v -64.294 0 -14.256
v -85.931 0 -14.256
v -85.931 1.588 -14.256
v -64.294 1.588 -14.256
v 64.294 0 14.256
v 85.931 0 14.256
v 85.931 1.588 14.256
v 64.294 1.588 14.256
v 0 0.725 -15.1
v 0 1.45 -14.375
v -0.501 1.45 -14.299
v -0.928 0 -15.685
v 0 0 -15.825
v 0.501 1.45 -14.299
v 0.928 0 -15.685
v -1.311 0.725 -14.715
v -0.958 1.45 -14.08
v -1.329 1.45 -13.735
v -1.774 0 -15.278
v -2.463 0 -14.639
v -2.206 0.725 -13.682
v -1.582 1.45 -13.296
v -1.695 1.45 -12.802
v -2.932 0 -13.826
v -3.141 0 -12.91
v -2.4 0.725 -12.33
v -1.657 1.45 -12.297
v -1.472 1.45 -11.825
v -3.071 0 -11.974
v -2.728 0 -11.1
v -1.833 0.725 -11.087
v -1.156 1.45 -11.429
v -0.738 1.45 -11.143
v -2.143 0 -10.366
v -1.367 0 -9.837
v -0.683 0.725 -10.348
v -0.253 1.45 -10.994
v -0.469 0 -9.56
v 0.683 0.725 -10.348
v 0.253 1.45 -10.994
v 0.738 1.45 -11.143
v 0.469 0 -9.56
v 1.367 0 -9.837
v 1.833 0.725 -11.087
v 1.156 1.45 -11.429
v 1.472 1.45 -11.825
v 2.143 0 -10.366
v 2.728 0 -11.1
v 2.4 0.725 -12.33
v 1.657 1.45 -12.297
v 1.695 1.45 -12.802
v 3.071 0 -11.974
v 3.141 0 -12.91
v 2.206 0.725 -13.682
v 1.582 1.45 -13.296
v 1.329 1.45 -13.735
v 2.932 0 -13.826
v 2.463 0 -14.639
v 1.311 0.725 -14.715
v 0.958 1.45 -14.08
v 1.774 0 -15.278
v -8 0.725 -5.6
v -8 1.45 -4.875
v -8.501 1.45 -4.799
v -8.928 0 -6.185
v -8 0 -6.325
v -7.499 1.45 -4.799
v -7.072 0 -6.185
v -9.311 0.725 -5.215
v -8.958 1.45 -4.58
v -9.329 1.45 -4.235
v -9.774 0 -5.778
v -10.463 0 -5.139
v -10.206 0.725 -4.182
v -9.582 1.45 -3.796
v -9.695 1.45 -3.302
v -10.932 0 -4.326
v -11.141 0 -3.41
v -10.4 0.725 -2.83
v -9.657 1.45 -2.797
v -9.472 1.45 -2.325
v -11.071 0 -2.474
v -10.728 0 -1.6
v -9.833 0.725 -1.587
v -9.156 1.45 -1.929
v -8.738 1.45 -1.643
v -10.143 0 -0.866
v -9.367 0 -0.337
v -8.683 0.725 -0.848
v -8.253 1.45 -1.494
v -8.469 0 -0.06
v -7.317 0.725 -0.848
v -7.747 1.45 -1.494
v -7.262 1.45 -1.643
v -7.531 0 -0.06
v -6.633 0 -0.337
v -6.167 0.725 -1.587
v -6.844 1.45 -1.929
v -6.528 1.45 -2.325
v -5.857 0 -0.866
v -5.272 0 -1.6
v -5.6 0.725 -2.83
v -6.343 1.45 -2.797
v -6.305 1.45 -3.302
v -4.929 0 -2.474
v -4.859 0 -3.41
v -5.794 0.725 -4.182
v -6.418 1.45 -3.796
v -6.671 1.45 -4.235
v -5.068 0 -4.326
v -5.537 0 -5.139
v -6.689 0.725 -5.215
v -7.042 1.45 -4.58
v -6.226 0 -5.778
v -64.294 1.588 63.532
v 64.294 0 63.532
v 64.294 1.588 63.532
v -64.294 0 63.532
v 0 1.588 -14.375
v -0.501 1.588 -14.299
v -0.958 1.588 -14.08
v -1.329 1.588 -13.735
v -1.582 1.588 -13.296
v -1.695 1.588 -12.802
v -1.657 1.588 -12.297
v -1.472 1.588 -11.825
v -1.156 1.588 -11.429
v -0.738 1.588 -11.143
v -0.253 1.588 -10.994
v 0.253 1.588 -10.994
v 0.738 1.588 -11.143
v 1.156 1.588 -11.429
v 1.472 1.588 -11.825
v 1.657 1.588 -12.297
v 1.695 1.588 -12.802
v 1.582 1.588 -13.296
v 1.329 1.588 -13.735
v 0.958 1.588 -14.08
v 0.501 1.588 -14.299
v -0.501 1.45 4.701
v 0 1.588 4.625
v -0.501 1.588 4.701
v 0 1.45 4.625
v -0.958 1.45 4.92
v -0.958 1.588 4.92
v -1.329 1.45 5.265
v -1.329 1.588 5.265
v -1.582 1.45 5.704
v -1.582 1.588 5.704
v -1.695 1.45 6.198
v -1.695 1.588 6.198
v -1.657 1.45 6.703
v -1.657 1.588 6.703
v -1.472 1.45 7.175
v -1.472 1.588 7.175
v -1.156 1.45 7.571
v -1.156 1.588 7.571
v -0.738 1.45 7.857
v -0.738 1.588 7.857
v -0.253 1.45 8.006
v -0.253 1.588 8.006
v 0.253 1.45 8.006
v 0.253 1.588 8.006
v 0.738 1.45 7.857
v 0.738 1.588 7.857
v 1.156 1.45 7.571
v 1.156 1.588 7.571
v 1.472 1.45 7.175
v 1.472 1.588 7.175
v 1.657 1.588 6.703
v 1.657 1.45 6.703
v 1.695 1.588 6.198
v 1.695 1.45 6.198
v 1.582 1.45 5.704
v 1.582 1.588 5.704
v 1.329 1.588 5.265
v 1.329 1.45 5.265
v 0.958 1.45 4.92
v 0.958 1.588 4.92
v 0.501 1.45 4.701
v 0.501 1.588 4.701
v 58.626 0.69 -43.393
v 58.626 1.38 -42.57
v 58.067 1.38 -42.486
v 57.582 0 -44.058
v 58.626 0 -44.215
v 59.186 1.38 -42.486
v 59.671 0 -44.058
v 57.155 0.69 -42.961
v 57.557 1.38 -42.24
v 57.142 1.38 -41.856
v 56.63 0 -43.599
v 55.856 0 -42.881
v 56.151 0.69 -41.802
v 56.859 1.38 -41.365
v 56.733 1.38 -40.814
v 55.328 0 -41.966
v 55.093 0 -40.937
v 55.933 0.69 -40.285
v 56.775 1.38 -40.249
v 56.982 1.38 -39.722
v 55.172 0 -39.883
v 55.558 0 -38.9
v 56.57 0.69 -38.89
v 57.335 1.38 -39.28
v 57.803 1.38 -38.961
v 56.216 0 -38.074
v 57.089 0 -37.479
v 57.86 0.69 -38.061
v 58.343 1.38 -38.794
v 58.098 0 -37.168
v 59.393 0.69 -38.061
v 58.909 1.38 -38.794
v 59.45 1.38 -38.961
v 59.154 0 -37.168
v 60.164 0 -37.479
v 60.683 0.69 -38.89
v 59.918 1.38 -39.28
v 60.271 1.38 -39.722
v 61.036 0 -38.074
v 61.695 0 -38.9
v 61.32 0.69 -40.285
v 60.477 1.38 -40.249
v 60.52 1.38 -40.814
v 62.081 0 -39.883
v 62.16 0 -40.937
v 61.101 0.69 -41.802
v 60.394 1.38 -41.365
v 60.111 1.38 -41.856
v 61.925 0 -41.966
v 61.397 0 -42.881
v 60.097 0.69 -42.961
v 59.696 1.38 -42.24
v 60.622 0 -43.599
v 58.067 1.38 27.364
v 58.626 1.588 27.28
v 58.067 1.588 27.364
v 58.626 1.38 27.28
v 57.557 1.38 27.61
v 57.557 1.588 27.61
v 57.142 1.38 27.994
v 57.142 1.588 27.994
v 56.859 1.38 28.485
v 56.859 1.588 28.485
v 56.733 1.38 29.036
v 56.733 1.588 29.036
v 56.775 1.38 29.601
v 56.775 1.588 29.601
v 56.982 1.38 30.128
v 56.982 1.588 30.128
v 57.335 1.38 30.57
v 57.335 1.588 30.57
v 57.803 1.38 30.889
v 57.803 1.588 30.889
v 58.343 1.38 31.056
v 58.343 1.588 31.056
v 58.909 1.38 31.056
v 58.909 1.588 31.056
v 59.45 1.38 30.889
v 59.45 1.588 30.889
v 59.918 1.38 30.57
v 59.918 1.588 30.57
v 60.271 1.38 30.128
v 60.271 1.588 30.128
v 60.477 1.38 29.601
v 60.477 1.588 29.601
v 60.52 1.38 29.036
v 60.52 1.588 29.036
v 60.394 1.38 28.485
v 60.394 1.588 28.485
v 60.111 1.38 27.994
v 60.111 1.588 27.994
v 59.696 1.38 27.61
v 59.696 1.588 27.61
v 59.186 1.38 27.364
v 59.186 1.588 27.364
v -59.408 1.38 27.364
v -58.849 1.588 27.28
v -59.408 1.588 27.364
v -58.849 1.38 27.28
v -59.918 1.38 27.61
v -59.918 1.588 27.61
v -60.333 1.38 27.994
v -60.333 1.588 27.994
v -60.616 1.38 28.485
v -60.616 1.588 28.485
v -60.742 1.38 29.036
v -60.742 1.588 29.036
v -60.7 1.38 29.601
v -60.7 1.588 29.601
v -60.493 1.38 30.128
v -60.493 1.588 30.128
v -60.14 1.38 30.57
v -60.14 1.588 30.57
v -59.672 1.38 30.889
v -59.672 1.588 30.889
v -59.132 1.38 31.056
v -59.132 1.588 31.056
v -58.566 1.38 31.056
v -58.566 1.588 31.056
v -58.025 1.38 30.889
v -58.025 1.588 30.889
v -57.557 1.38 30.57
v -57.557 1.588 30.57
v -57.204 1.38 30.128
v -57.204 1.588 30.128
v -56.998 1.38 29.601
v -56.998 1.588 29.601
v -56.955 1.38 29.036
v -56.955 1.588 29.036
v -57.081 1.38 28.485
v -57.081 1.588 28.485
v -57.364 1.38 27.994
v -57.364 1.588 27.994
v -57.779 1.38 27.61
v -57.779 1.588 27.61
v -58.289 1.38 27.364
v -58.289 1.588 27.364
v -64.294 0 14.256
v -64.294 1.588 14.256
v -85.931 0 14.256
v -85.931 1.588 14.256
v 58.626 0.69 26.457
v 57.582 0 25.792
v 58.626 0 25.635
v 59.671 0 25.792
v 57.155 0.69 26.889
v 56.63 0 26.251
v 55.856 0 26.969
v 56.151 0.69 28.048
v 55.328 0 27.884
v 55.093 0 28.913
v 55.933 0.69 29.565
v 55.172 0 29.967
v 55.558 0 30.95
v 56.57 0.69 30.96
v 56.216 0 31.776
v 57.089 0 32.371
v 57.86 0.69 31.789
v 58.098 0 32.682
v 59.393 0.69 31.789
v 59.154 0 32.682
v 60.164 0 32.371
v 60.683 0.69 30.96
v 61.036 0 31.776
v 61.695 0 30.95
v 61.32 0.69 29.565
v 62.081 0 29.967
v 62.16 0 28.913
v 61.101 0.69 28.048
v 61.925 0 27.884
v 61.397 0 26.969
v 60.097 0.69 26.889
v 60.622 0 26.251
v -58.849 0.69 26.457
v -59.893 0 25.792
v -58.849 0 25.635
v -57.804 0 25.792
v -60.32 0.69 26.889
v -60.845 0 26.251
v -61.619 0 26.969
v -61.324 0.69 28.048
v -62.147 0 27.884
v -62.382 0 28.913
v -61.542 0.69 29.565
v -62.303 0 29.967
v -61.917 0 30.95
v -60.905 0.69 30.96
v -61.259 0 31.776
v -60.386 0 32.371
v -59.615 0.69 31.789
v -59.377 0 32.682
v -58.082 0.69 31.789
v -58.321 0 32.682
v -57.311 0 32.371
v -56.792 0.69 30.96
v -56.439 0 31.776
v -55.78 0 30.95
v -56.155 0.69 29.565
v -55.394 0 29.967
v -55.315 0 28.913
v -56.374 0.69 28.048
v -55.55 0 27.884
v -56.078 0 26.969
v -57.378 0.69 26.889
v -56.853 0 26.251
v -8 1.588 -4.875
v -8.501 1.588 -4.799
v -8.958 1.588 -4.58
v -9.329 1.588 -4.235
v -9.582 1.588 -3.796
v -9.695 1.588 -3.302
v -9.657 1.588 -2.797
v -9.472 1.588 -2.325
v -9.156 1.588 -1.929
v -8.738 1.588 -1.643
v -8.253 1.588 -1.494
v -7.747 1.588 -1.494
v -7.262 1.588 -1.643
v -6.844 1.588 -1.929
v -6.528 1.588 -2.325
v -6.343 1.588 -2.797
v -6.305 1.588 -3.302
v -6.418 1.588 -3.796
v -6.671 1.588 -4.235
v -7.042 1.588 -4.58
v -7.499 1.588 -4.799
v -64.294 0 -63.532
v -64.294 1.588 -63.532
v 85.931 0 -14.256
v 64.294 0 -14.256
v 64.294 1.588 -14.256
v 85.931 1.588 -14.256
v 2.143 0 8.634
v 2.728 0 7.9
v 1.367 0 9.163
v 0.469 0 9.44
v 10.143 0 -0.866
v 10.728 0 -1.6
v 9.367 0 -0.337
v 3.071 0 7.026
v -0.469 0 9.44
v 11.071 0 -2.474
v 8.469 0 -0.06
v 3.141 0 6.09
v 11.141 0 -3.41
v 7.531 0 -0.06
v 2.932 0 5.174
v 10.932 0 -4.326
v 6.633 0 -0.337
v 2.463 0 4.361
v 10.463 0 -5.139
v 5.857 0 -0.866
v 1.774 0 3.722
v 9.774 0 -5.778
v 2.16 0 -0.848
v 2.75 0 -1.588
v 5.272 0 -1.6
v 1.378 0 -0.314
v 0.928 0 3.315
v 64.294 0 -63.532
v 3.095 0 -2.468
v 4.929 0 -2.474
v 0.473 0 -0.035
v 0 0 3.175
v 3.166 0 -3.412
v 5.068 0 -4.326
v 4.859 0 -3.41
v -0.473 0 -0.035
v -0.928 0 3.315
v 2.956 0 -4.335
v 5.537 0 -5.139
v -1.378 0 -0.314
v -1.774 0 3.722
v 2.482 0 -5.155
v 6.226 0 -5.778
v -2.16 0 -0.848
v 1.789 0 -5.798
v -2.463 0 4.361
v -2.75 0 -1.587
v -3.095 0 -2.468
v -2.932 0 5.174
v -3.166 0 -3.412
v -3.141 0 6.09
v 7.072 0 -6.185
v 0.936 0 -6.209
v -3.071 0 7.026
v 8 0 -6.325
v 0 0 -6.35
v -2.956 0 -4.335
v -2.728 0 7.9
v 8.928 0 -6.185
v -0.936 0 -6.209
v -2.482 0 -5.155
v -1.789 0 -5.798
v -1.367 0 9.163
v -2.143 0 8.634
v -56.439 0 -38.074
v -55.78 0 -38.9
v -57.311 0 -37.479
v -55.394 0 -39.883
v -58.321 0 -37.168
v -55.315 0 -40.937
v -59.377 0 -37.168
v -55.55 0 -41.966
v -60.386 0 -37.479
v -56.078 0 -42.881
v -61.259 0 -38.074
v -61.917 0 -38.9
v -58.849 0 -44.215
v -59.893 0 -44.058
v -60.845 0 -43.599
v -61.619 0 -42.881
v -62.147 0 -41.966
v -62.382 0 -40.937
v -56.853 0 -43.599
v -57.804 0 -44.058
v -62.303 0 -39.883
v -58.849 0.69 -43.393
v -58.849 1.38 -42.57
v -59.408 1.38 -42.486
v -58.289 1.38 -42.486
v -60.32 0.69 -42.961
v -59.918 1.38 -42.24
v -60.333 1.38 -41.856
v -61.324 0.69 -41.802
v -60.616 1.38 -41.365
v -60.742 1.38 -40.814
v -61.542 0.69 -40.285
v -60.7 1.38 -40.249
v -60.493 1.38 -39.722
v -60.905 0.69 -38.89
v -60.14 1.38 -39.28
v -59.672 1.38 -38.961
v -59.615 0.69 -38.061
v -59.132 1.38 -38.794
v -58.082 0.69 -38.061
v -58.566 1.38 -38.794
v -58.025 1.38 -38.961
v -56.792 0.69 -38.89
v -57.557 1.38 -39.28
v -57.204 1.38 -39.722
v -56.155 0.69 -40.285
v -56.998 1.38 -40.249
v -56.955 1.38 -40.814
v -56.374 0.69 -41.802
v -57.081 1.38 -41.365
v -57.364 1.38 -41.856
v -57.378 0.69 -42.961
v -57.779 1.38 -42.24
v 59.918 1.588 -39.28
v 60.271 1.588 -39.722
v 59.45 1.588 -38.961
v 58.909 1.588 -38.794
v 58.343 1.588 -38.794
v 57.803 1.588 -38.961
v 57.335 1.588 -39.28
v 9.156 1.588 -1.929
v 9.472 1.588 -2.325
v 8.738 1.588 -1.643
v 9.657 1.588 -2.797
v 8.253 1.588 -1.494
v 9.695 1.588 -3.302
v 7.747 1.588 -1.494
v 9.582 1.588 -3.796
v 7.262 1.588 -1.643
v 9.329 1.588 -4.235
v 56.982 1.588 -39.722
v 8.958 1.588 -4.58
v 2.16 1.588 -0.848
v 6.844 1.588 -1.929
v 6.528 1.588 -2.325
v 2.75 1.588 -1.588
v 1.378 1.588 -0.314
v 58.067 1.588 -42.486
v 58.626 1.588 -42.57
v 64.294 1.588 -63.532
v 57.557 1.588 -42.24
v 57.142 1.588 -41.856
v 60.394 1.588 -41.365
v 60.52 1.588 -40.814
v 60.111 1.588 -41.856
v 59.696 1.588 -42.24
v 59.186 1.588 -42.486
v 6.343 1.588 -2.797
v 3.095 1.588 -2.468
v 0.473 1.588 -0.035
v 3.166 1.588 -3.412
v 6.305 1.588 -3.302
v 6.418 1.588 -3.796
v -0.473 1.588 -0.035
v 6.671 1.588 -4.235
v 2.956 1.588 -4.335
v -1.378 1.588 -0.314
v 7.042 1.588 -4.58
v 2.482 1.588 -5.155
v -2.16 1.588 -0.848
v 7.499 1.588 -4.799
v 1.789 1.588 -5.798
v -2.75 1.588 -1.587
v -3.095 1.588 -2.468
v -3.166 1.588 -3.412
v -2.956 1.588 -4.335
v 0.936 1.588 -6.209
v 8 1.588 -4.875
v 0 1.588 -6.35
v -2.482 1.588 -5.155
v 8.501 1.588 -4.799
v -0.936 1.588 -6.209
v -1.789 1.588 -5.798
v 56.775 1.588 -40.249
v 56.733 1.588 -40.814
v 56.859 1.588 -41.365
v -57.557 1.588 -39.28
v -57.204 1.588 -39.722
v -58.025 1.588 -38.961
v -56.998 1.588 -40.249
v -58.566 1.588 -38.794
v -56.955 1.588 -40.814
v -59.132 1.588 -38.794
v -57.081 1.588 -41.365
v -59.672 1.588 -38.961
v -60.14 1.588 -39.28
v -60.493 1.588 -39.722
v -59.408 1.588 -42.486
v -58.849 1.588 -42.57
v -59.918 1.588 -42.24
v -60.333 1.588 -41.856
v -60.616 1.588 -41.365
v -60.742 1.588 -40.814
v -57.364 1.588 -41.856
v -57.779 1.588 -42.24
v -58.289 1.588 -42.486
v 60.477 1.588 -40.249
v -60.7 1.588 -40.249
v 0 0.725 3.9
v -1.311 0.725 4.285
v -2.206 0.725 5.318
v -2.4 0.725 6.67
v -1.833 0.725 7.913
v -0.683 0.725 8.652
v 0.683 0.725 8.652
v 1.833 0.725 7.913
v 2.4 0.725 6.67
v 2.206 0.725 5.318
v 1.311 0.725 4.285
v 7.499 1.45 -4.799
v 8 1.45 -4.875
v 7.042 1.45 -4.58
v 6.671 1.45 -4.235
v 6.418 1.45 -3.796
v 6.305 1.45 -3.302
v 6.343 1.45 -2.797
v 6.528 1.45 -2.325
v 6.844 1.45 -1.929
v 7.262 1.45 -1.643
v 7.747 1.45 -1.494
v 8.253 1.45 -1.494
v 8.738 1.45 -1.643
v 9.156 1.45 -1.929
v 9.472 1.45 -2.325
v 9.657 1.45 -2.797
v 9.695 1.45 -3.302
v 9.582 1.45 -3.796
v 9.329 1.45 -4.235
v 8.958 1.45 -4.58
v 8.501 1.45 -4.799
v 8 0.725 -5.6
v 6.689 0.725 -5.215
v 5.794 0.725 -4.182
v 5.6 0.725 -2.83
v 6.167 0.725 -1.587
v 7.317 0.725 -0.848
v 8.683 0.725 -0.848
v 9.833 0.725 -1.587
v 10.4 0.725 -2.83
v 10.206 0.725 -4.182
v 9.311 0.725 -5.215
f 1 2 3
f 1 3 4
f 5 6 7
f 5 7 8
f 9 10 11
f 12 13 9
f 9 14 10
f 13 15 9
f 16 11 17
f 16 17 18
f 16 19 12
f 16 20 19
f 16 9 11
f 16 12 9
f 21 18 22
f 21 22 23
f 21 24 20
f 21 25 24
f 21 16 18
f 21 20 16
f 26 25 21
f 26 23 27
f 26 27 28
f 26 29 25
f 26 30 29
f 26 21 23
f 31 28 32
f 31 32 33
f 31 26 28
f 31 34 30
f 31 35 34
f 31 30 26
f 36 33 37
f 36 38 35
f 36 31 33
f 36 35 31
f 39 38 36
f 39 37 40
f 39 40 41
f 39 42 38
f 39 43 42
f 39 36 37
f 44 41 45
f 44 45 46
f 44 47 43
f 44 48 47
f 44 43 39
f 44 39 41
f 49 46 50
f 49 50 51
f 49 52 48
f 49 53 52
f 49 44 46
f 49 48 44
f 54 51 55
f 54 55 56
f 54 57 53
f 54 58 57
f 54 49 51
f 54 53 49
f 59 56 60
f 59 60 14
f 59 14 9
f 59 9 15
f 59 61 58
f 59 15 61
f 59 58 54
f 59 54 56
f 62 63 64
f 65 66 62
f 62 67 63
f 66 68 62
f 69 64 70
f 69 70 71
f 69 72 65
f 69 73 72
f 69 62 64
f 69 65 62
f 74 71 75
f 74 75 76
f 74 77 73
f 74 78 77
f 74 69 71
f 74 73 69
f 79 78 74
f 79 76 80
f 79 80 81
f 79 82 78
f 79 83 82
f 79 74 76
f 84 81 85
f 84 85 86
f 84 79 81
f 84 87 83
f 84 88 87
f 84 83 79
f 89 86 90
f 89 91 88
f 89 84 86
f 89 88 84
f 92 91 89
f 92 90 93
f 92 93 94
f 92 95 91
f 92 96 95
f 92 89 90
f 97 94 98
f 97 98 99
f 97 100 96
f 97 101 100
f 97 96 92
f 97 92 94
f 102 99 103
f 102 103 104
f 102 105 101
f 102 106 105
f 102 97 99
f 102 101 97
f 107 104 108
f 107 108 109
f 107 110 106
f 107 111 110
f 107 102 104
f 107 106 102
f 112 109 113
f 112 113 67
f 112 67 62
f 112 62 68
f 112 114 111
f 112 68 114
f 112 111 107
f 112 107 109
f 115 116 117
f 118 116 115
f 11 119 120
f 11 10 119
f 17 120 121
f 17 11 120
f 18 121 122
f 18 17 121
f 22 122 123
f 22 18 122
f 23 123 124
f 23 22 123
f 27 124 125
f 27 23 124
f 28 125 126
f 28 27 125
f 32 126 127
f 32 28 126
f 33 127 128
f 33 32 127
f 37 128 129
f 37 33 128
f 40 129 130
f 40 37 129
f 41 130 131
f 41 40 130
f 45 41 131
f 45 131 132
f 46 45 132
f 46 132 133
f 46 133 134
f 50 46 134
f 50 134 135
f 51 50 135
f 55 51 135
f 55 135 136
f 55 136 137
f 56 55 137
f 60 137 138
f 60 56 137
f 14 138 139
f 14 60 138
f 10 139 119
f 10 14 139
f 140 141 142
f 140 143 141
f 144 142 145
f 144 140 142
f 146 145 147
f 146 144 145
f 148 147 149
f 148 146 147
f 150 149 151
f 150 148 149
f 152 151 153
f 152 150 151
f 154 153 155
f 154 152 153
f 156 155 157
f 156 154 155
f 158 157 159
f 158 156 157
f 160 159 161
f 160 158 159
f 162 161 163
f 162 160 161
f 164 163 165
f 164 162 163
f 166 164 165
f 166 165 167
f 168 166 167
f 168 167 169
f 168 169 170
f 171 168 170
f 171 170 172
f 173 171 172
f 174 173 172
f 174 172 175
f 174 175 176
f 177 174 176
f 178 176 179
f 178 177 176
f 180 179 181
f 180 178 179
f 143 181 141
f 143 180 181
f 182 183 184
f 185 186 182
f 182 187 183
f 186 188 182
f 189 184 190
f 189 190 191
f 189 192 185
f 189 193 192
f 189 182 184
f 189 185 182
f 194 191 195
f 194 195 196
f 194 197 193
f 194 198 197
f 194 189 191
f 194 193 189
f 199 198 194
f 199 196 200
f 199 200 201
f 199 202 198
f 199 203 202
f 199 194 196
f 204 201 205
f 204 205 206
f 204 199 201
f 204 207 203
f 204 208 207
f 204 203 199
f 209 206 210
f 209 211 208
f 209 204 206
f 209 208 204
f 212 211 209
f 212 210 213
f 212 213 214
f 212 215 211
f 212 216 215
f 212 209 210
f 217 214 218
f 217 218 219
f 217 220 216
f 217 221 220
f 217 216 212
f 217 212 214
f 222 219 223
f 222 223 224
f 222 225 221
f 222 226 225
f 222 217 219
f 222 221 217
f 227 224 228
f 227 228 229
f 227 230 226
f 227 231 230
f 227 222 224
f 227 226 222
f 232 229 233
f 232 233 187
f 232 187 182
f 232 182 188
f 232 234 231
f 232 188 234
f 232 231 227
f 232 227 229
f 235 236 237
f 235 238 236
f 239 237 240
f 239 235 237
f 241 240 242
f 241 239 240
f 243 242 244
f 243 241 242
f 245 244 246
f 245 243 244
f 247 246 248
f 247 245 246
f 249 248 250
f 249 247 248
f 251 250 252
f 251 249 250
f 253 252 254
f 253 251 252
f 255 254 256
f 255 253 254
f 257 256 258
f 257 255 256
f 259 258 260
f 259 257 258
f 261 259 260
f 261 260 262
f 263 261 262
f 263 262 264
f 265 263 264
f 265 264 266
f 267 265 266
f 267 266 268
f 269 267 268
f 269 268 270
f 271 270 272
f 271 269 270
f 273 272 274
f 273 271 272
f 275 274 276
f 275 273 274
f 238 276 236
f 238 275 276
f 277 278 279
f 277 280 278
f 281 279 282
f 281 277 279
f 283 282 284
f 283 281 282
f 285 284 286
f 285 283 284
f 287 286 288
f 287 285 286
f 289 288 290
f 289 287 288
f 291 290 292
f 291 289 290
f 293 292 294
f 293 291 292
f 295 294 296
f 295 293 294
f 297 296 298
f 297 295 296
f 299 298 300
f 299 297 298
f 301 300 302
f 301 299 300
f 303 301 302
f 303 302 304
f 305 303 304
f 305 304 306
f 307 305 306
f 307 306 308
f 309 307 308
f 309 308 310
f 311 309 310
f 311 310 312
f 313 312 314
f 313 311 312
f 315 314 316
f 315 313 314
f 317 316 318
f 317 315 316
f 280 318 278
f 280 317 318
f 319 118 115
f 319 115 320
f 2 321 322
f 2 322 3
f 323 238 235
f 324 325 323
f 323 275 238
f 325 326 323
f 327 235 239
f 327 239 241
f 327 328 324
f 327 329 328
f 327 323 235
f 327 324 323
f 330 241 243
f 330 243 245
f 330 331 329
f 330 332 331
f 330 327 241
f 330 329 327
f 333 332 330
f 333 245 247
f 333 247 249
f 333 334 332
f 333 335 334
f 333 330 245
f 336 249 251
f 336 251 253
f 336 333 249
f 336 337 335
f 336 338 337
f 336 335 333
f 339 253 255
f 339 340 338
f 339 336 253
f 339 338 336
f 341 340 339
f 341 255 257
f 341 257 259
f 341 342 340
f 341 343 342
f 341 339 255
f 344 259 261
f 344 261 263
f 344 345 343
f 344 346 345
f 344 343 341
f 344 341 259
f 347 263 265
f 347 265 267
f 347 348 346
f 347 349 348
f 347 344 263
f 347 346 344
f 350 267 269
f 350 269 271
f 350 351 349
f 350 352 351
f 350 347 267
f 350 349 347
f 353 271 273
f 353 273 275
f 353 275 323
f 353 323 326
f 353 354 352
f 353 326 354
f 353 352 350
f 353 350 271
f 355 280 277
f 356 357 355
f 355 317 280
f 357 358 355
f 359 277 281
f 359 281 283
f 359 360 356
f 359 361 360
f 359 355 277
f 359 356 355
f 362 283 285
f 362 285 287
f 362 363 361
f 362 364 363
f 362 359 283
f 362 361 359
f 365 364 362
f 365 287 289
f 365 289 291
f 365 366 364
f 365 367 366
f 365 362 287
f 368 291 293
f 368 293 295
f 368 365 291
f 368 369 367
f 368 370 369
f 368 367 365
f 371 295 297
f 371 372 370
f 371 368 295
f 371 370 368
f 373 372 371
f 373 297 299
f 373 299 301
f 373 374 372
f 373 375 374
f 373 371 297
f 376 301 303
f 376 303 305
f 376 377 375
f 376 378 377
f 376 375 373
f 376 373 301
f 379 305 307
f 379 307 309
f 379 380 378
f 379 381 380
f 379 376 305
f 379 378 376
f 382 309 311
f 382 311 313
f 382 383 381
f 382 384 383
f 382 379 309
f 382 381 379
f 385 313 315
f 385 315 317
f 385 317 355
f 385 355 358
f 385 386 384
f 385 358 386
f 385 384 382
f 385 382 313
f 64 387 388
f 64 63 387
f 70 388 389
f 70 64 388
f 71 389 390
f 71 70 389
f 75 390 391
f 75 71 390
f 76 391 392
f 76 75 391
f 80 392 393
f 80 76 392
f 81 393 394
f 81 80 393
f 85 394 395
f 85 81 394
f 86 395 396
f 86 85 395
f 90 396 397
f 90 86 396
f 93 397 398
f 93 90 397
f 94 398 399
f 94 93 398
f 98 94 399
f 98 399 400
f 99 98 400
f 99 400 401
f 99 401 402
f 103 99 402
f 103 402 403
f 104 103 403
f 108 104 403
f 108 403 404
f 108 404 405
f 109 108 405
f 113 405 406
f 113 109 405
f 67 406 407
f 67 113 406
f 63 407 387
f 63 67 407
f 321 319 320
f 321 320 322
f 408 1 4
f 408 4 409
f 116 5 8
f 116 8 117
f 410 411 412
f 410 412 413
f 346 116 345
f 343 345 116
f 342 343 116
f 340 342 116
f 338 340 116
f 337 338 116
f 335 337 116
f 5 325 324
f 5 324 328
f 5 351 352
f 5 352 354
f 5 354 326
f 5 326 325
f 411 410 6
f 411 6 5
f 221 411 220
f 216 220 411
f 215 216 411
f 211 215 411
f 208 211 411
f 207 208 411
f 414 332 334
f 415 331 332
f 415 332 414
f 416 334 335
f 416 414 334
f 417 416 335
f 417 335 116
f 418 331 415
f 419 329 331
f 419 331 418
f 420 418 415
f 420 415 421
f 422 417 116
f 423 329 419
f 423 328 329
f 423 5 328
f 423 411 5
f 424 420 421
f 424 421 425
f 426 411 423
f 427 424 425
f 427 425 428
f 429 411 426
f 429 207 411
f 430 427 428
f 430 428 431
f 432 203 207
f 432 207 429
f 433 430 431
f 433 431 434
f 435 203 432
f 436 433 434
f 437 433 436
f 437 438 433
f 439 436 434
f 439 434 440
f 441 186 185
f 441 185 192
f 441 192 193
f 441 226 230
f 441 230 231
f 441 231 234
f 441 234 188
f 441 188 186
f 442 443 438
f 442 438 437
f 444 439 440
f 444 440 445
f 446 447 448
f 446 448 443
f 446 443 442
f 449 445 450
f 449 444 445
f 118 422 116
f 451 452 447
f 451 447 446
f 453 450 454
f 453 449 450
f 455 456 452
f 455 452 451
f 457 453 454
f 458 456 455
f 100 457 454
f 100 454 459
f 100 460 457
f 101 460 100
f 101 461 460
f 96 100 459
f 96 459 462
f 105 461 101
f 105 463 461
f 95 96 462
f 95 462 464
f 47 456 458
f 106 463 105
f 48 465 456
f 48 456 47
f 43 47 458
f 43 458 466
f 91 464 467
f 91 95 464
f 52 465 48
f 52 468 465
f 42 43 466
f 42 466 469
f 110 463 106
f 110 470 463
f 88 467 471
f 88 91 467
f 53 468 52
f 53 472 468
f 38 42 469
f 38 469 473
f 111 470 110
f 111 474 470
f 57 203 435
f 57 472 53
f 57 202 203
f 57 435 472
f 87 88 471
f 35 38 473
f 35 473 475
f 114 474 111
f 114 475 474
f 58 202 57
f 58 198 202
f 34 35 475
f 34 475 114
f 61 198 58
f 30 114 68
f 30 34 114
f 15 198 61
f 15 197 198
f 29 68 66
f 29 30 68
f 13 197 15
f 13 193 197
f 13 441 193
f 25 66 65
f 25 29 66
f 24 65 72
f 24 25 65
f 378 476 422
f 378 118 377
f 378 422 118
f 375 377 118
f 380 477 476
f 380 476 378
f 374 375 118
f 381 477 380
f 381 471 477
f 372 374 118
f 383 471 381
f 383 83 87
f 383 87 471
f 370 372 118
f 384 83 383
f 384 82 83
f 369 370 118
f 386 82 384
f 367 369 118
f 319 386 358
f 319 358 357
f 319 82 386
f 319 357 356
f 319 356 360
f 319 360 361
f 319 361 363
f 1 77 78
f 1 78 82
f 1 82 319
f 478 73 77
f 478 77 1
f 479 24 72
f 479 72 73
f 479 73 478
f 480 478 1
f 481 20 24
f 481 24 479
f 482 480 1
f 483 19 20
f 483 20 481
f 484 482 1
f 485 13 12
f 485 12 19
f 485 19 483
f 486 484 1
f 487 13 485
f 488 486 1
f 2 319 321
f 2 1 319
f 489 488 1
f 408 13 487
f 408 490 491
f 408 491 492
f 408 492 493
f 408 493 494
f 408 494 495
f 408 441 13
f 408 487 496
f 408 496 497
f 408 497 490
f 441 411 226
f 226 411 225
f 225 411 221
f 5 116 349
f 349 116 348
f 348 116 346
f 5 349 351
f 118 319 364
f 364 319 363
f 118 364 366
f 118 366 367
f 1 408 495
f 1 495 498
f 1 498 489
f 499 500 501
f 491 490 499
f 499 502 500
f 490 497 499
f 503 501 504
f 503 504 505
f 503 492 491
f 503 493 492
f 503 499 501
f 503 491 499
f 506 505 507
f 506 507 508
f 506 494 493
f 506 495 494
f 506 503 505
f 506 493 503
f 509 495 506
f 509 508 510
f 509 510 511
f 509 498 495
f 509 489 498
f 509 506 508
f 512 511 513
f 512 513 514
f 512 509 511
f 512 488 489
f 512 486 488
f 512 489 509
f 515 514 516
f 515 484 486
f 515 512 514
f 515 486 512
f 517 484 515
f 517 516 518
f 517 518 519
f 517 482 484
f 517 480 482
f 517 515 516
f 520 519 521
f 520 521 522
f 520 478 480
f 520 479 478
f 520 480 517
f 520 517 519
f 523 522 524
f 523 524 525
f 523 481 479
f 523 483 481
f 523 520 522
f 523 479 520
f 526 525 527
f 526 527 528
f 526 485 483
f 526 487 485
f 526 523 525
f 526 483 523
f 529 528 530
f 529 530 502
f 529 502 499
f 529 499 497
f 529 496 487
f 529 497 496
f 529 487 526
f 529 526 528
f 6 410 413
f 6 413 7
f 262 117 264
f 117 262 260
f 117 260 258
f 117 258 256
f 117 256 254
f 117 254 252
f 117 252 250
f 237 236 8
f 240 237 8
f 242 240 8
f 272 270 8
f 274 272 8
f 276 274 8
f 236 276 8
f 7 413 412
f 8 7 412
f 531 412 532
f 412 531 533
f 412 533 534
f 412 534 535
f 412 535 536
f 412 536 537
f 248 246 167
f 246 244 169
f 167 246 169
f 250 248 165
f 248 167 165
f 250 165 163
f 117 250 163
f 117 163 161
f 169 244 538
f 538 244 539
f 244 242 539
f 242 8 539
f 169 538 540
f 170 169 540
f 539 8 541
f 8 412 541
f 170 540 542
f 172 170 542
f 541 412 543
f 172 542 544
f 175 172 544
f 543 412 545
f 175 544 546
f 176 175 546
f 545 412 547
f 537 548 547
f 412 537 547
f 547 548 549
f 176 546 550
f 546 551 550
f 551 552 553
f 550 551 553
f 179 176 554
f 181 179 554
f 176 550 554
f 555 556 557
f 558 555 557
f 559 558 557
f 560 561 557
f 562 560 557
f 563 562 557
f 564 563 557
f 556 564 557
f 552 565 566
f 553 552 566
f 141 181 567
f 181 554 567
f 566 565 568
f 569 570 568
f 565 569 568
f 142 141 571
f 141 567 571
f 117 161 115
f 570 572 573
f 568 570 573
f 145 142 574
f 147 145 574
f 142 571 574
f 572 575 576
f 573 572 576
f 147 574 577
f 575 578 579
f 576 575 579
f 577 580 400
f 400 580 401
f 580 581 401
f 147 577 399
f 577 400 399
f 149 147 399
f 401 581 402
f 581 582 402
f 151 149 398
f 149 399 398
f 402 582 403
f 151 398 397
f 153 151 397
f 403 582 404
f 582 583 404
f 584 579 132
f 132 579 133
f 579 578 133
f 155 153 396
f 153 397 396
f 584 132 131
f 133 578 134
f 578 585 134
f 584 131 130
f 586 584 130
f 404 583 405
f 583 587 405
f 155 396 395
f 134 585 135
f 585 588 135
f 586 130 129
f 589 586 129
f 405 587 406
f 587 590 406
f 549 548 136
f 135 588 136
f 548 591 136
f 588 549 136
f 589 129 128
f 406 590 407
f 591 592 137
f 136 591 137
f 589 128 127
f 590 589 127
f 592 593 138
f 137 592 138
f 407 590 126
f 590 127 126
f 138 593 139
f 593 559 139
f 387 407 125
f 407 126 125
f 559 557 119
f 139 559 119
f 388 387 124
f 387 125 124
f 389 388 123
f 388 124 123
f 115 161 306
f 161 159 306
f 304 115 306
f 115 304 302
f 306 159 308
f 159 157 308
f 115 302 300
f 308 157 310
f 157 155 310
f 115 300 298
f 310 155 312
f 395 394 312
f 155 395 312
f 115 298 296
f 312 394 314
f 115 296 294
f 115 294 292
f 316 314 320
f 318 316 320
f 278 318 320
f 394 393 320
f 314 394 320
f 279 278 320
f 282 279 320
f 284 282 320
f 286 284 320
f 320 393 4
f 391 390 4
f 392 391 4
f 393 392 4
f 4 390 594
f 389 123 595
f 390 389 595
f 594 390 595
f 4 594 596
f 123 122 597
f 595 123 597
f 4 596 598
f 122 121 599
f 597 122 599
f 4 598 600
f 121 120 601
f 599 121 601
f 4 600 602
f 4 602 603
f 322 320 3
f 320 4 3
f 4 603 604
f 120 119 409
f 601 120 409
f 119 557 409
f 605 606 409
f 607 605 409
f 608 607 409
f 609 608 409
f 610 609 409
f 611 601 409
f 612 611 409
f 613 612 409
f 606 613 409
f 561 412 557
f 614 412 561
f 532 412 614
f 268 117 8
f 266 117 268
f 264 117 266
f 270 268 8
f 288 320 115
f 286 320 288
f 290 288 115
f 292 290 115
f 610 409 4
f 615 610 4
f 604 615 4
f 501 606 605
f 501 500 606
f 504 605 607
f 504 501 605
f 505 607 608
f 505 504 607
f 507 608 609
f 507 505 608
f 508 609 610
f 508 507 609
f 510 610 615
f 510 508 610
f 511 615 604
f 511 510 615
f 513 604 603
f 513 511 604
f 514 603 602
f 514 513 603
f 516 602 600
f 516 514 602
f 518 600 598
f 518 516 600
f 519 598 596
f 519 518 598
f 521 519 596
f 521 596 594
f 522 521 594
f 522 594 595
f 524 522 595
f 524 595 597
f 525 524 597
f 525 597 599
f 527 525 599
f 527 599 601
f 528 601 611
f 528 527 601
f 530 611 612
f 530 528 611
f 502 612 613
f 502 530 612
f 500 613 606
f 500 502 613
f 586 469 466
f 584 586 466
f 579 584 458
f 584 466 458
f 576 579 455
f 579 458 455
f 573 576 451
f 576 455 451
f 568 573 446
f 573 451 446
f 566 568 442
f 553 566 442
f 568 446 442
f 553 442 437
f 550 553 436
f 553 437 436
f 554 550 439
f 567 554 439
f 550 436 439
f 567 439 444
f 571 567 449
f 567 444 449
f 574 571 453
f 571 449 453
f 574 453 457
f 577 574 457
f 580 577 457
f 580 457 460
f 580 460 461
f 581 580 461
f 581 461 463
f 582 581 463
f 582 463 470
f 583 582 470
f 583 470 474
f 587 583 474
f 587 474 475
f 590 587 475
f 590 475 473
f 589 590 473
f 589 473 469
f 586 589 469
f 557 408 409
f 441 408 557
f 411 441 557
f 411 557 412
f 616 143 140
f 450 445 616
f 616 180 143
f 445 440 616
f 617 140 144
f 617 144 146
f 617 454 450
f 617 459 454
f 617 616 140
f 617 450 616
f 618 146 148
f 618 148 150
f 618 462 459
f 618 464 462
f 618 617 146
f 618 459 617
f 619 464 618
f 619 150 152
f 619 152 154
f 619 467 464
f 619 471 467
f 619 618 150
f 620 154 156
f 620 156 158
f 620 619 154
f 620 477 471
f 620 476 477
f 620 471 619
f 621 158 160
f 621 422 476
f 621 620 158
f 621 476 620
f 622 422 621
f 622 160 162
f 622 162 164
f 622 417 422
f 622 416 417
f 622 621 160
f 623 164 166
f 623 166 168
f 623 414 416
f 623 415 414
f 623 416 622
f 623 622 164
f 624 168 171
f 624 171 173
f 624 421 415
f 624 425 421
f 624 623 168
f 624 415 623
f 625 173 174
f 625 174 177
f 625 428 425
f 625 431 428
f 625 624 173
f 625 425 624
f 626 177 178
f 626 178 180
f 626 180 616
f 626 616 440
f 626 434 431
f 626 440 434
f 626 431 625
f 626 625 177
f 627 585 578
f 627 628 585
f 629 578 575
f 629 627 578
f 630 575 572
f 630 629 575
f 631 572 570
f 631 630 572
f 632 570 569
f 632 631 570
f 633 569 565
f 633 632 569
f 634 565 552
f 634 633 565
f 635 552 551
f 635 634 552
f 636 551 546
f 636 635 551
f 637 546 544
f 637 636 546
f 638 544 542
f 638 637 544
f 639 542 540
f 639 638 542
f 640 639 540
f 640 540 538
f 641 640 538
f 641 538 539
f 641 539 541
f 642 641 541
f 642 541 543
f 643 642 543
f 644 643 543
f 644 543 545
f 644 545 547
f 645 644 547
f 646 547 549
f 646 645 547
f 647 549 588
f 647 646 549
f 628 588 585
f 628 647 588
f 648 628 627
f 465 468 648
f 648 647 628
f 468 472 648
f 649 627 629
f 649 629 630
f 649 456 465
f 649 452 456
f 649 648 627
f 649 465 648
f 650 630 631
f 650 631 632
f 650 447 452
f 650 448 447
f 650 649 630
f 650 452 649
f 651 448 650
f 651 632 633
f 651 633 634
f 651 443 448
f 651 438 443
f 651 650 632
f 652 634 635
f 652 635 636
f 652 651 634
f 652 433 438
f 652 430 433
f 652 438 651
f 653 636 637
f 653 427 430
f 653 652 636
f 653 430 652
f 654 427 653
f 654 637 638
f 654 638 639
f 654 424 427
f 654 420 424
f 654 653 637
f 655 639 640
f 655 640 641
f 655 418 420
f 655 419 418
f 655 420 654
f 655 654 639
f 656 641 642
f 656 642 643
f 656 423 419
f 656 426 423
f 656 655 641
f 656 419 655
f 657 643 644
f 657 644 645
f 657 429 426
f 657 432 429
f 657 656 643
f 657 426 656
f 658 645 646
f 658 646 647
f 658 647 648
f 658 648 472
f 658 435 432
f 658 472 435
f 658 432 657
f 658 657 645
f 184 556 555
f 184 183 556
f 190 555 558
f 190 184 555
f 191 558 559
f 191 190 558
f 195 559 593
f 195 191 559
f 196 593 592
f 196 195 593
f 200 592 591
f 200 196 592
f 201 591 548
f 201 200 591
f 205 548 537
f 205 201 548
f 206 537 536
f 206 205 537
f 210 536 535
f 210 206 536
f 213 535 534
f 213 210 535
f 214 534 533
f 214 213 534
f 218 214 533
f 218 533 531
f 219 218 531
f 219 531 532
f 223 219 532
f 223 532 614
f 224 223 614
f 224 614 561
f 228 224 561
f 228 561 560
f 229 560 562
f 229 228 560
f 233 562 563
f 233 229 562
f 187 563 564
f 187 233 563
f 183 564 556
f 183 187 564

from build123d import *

# Parameters (mm, degrees)
BOSS_EXTRUDE1_DEPTH                            = 1.5875
CSK_FOR_6_FLAT_HEAD_MACHINE_SCREW_2_COUNT      = 2
CSK_FOR_6_FLAT_HEAD_MACHINE_SCREW_2_PITCH      = 69.85
CSK_FOR_6_FLAT_HEAD_MACHINE_SCREW_3_COUNT      = 2
CSK_FOR_6_FLAT_HEAD_MACHINE_SCREW_3_PITCH      = 136.672594638
CSK_FOR_6_FLAT_HEAD_MACHINE_SCREW_4_COUNT      = 2
CSK_FOR_6_FLAT_HEAD_MACHINE_SCREW_4_PITCH      = 117.475
SKETCH4_R                                      = 3.175
CUT_EXTRUDE1_DEPTH                             = 107.878457248
CSK_FOR_M3_FLAT_HEAD_MACHINE_SCREW2_AT_2_COUNT = 2
CSK_FOR_M3_FLAT_HEAD_MACHINE_SCREW2_AT_2_PITCH = 16
CSK_FOR_M3_FLAT_HEAD_MACHINE_SCREW2_AT_3_COUNT = 2
CSK_FOR_M3_FLAT_HEAD_MACHINE_SCREW2_AT_3_PITCH = 12.419742348
CSK_FOR_M3_FLAT_HEAD_MACHINE_SCREW2_AT_4_COUNT = 2
CSK_FOR_M3_FLAT_HEAD_MACHINE_SCREW2_AT_4_PITCH = 12.419742348


with BuildPart() as part:
    # Sketch1 → Boss-Extrude1 (new body)
    with BuildSketch(Plane(origin=(0, 0, 0), x_dir=(1, 0, 0), z_dir=(0, 1, 0))):
        Polygon((-64.29375, 63.53175), (64.29375, 63.53175), (64.29375, 14.25575), (85.931375, 14.25575), (85.931375, -14.25575), (64.29375, -14.25575), (64.29375, -63.53175), (-64.29375, -63.53175), (-64.29375, -14.25575), (-85.931375, -14.25575), (-85.931375, 14.25575), (-64.29375, 14.25575), align=None)
    extrude(amount=BOSS_EXTRUDE1_DEPTH)

    # Sketch2 → CSK for #6 Flat Head Machine Screw (100)1 (revolve, cut)
    with BuildSketch(Plane(origin=(-58.848625, 0, 29.17825), x_dir=(0, 0, -1), z_dir=(1, 0, 0))):
        Polygon((0, 0), (0, 1.5875), (1.89865, 1.5875), (1.89865, 1.380025208), (3.5433, 0), align=None)
    csk_for_6_flat_head_machine_screw_100 = revolve(axis=Axis((-58.848625, -6.35, 29.17825), (0, 1, 0)), mode=Mode.SUBTRACT)

    # CSK for _6 Flat Head Machine Screw _ 2: CSK for #6 Flat Head Machine Screw (100)1 ×2
    with Locations(*[(0, 0, -i * CSK_FOR_6_FLAT_HEAD_MACHINE_SCREW_2_PITCH) for i in range(1, CSK_FOR_6_FLAT_HEAD_MACHINE_SCREW_2_COUNT)]):
        add(csk_for_6_flat_head_machine_screw_100, mode=Mode.SUBTRACT)

    # CSK for _6 Flat Head Machine Screw _ 3: CSK for #6 Flat Head Machine Screw (100)1 ×2
    with Locations(*[Vector(0.8595358880206613, 0, -0.5110753928771502) * (i * CSK_FOR_6_FLAT_HEAD_MACHINE_SCREW_3_PITCH) for i in range(1, CSK_FOR_6_FLAT_HEAD_MACHINE_SCREW_3_COUNT)]):
        add(csk_for_6_flat_head_machine_screw_100, mode=Mode.SUBTRACT)

    # CSK for _6 Flat Head Machine Screw _ 4: CSK for #6 Flat Head Machine Screw (100)1 ×2
    with Locations(*[(i * CSK_FOR_6_FLAT_HEAD_MACHINE_SCREW_4_PITCH, 0, 0) for i in range(1, CSK_FOR_6_FLAT_HEAD_MACHINE_SCREW_4_COUNT)]):
        add(csk_for_6_flat_head_machine_screw_100, mode=Mode.SUBTRACT)

    # Sketch4 → Cut-Extrude1 (cut, through all)
    with BuildSketch(Plane.XZ):
        with Locations(Location((0, -3.175, 0), (0, 0, 270))):
            Circle(SKETCH4_R)
    extrude(amount=-CUT_EXTRUDE1_DEPTH, mode=Mode.SUBTRACT)

    # Sketch5 → CSK for M3 Flat Head Machine Screw2 (revolve, cut)
    with BuildSketch(Plane(origin=(8, 0, -3.175), x_dir=(0, 0, -1), z_dir=(1, 0, 0))):
        Polygon((0, 0), (0, 1.5875), (1.7, 1.5875), (1.7, 1.45), (3.15, 0), align=None)
    csk_for_m3_flat_head_machine_screw2 = revolve(axis=Axis((8, -6.35, -3.175), (0, 1, 0)), mode=Mode.SUBTRACT)

    # CSK for M3 Flat Head Machine Screw2 at 2: CSK for M3 Flat Head Machine Screw2 ×2
    with Locations(*[(-i * CSK_FOR_M3_FLAT_HEAD_MACHINE_SCREW2_AT_2_PITCH, 0, 0) for i in range(1, CSK_FOR_M3_FLAT_HEAD_MACHINE_SCREW2_AT_2_COUNT)]):
        add(csk_for_m3_flat_head_machine_screw2, mode=Mode.SUBTRACT)

    # CSK for M3 Flat Head Machine Screw2 at 3: CSK for M3 Flat Head Machine Screw2 ×2
    with Locations(*[Vector(-0.6441357457827798, 0, -0.7649111981170509) * (i * CSK_FOR_M3_FLAT_HEAD_MACHINE_SCREW2_AT_3_PITCH) for i in range(1, CSK_FOR_M3_FLAT_HEAD_MACHINE_SCREW2_AT_3_COUNT)]):
        add(csk_for_m3_flat_head_machine_screw2, mode=Mode.SUBTRACT)

    # CSK for M3 Flat Head Machine Screw2 at 4: CSK for M3 Flat Head Machine Screw2 ×2
    with Locations(*[Vector(-0.6441357457827798, 0, 0.7649111981170509) * (i * CSK_FOR_M3_FLAT_HEAD_MACHINE_SCREW2_AT_4_PITCH) for i in range(1, CSK_FOR_M3_FLAT_HEAD_MACHINE_SCREW2_AT_4_COUNT)]):
        add(csk_for_m3_flat_head_machine_screw2, mode=Mode.SUBTRACT)


solid = part.part
